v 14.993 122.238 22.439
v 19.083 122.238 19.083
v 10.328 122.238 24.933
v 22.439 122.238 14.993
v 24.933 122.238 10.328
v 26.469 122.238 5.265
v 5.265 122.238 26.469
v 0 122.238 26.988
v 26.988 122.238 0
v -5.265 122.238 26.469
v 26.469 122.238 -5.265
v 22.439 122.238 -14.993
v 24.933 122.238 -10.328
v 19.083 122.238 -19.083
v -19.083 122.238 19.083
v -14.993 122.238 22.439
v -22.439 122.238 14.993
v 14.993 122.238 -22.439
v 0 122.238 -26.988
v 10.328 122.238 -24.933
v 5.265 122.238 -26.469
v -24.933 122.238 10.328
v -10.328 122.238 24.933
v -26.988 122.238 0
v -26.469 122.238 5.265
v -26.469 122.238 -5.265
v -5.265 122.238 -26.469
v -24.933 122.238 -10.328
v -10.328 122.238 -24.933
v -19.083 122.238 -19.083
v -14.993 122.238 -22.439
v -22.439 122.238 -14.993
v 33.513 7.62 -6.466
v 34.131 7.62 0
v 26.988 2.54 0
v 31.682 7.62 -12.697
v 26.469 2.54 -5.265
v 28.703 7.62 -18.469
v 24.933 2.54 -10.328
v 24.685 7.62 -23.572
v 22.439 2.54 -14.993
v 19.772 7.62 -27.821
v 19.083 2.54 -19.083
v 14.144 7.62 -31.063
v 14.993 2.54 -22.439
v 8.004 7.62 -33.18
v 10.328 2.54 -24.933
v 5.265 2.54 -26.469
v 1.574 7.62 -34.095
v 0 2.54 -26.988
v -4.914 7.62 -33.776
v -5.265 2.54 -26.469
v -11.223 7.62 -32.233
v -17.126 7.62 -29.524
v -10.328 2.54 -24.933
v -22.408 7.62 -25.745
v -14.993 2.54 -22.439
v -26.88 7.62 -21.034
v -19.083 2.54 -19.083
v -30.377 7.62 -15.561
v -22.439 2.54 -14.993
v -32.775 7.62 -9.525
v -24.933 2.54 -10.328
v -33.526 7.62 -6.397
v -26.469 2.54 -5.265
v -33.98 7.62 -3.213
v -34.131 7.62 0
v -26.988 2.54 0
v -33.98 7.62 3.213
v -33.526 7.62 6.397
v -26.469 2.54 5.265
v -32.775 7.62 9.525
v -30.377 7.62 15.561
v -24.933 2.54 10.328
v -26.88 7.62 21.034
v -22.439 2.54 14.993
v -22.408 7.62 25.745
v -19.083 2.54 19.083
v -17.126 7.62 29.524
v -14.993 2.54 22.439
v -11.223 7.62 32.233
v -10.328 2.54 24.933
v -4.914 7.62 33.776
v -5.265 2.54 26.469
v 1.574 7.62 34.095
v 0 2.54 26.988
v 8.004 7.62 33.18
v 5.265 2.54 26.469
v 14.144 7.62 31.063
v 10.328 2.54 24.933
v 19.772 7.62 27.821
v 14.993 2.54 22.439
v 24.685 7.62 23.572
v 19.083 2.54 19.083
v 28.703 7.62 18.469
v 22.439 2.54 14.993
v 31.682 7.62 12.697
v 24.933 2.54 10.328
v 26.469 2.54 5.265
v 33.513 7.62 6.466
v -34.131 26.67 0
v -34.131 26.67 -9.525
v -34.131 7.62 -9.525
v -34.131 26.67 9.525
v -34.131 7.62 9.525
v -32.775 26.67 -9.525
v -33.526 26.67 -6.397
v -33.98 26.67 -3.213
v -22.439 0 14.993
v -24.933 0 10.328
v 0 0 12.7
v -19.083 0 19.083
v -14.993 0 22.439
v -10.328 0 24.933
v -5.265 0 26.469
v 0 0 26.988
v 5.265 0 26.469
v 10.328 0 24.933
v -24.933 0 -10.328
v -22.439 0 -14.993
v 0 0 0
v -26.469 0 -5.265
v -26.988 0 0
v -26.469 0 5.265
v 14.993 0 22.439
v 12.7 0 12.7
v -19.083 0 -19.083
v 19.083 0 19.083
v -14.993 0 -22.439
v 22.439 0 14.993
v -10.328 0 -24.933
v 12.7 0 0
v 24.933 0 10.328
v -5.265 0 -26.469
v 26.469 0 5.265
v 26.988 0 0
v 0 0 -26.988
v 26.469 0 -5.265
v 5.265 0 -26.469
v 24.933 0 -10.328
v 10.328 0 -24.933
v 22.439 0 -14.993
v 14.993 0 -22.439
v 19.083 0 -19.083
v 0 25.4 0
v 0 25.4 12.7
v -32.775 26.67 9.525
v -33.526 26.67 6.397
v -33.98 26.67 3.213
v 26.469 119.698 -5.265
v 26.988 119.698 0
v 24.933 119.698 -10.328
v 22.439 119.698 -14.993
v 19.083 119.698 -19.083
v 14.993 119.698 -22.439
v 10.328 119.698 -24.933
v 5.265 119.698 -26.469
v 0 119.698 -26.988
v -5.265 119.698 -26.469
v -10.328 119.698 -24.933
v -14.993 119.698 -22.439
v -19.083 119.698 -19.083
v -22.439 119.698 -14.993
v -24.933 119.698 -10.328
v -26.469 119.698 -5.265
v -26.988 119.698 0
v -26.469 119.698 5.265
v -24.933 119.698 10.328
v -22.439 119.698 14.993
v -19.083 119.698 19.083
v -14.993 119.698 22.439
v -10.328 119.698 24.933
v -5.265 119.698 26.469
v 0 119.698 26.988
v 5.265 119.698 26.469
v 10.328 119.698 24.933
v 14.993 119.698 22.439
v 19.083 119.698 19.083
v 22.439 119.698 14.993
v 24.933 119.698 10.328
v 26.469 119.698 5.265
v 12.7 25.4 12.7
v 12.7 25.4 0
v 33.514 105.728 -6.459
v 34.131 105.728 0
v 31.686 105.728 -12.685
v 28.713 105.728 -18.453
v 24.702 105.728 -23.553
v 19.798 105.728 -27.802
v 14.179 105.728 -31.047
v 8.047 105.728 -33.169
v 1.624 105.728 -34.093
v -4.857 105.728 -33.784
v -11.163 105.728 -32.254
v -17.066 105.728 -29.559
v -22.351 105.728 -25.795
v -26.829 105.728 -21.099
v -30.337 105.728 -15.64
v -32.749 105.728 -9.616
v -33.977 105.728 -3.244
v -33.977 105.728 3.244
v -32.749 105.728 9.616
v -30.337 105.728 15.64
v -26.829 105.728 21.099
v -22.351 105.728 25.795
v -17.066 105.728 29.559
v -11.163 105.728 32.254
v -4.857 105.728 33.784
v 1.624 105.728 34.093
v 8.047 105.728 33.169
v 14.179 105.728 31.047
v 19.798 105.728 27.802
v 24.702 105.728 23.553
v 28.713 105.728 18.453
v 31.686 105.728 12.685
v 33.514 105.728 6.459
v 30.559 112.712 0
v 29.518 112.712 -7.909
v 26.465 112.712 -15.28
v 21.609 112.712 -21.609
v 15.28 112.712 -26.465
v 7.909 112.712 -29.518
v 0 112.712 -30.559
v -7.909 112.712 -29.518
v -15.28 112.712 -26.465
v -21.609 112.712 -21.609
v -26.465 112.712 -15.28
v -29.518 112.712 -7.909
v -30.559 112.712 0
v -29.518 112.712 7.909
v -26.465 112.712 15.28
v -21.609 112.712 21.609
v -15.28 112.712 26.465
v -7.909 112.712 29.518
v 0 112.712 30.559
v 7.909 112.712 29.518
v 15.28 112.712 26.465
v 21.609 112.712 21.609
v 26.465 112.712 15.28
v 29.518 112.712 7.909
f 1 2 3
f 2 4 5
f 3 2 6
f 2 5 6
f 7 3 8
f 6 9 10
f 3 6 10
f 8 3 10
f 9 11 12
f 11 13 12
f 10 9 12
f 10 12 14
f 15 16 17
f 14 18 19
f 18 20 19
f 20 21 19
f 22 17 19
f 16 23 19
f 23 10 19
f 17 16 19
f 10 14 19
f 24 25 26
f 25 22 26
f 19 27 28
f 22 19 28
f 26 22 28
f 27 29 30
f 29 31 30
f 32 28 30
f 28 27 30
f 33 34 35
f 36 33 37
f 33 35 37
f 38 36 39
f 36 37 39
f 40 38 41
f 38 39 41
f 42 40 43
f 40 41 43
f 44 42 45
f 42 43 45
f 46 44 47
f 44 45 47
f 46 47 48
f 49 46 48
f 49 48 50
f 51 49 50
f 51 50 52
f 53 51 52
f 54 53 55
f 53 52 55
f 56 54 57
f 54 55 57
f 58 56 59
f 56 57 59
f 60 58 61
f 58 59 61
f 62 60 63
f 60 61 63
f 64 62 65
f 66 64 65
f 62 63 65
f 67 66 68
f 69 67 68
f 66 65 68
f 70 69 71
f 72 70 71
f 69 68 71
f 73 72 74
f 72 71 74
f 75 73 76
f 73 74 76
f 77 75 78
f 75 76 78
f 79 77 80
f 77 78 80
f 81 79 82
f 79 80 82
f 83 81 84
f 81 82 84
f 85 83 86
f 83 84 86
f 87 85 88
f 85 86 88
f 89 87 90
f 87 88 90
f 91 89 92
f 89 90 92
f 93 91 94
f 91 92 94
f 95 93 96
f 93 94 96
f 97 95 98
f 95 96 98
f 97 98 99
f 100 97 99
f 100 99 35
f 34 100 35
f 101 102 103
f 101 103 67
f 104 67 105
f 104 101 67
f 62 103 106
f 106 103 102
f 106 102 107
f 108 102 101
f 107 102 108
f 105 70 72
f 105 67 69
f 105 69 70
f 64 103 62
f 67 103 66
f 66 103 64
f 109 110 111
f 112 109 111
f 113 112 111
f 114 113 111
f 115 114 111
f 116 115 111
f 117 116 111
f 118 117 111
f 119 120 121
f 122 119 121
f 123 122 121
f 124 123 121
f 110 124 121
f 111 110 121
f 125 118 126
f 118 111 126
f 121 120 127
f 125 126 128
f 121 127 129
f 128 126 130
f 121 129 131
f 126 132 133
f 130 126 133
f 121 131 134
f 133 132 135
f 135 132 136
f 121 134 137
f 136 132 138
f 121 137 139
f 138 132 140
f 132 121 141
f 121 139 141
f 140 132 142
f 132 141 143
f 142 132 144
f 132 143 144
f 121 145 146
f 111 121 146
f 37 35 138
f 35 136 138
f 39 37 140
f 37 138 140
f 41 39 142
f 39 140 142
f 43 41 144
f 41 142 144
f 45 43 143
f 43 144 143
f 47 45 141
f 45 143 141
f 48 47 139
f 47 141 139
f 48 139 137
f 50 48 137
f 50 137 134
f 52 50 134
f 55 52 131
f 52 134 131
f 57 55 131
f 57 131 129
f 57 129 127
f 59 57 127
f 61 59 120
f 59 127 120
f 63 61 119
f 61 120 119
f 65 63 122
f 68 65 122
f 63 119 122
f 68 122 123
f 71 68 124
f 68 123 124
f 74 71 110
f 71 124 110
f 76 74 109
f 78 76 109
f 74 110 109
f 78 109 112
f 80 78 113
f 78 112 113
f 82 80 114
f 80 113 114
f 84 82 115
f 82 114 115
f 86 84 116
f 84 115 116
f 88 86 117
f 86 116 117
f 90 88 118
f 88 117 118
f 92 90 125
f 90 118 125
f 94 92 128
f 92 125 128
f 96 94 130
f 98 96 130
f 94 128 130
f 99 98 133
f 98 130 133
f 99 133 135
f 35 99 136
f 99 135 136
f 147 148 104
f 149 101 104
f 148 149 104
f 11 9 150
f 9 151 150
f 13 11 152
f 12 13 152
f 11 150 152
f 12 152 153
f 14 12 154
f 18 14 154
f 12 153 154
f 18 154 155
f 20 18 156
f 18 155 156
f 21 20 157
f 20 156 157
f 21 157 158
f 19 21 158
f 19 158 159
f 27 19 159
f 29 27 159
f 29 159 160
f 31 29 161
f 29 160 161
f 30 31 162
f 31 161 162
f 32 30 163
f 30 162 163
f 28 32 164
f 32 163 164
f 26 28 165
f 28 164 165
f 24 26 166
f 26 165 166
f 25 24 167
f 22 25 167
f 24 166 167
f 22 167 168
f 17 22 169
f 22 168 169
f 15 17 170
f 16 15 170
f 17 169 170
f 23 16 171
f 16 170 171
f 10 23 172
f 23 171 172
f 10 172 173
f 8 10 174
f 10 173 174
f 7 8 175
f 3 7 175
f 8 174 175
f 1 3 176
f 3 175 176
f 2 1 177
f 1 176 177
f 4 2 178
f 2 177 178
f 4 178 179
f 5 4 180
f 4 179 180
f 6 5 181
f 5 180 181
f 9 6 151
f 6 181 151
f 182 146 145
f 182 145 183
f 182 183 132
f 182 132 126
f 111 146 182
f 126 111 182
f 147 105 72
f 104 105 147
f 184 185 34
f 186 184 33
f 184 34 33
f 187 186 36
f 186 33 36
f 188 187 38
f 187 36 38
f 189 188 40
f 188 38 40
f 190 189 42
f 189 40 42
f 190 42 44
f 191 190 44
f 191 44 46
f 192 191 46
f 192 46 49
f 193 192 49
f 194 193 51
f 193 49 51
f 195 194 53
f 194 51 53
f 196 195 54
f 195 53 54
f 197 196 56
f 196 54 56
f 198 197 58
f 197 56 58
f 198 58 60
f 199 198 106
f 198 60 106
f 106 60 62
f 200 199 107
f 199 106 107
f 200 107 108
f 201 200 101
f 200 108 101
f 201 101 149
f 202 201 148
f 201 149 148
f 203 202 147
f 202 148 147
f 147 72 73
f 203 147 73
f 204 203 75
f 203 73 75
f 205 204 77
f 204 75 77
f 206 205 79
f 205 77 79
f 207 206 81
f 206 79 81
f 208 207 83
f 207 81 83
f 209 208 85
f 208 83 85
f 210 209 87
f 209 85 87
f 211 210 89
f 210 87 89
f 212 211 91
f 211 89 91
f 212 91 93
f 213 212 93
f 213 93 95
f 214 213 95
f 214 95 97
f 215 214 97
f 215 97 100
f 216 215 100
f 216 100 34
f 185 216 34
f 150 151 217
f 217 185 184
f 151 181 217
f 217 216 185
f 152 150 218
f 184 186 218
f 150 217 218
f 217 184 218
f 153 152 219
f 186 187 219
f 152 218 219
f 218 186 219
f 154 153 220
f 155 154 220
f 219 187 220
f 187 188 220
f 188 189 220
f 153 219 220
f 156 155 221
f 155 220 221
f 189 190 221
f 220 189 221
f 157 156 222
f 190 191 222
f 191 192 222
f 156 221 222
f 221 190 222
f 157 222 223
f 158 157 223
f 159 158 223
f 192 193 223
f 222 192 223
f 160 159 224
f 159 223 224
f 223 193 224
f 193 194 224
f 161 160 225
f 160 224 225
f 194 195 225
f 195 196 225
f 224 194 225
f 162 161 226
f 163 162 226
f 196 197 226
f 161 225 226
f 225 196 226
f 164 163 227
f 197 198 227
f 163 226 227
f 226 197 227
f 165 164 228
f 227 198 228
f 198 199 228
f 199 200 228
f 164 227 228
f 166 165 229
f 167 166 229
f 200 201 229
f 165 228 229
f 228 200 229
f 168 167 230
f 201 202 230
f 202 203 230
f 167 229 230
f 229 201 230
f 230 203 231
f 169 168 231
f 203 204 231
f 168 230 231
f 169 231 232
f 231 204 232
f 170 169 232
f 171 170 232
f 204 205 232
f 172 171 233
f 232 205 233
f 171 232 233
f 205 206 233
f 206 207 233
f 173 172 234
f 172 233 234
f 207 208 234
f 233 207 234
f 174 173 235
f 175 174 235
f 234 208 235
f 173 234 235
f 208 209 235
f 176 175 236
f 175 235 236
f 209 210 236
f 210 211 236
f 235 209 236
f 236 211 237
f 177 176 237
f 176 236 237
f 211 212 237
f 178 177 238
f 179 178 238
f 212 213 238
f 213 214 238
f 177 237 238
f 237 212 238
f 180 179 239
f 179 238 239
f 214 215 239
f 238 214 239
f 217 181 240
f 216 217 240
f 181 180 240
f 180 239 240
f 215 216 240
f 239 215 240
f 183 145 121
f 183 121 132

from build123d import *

# Parameters (mm, degrees)
SKETCH2_W           = 19.05
SKETCH2_H           = 19.05
BOSS_EXTRUDE1_DEPTH = 7.62
SKETCH3_W           = 12.7
SKETCH3_H           = 12.7
CUT_EXTRUDE1_DEPTH  = 25.4


with BuildPart() as part:
    # Sketch1 → Revolve1 (revolve)
    with BuildSketch(Plane.XY):
        Polygon((0, 0), (0, 122.2375), (26.9875, 122.2375), (26.9875, 119.6975), (34.13125, 105.7275), (34.13125, 7.62), (26.9875, 2.54), (26.9875, 0), align=None)
    revolve(axis=Axis((0, 0, 0), (0, 1, 0)))

    # Sketch2 → Boss-Extrude1 (add)
    with BuildSketch(Plane.ZY.offset(34.13125)):
        with Locations((0, 17.145)):
            Rectangle(SKETCH2_W, SKETCH2_H)
    extrude(amount=-BOSS_EXTRUDE1_DEPTH)

    # Sketch3 → Cut-Extrude1 (cut)
    with BuildSketch(Plane.XZ):
        with Locations((6.35, 6.35)):
            Rectangle(SKETCH3_W, SKETCH3_H)
    extrude(amount=-CUT_EXTRUDE1_DEPTH, mode=Mode.SUBTRACT)


solid = part.part
